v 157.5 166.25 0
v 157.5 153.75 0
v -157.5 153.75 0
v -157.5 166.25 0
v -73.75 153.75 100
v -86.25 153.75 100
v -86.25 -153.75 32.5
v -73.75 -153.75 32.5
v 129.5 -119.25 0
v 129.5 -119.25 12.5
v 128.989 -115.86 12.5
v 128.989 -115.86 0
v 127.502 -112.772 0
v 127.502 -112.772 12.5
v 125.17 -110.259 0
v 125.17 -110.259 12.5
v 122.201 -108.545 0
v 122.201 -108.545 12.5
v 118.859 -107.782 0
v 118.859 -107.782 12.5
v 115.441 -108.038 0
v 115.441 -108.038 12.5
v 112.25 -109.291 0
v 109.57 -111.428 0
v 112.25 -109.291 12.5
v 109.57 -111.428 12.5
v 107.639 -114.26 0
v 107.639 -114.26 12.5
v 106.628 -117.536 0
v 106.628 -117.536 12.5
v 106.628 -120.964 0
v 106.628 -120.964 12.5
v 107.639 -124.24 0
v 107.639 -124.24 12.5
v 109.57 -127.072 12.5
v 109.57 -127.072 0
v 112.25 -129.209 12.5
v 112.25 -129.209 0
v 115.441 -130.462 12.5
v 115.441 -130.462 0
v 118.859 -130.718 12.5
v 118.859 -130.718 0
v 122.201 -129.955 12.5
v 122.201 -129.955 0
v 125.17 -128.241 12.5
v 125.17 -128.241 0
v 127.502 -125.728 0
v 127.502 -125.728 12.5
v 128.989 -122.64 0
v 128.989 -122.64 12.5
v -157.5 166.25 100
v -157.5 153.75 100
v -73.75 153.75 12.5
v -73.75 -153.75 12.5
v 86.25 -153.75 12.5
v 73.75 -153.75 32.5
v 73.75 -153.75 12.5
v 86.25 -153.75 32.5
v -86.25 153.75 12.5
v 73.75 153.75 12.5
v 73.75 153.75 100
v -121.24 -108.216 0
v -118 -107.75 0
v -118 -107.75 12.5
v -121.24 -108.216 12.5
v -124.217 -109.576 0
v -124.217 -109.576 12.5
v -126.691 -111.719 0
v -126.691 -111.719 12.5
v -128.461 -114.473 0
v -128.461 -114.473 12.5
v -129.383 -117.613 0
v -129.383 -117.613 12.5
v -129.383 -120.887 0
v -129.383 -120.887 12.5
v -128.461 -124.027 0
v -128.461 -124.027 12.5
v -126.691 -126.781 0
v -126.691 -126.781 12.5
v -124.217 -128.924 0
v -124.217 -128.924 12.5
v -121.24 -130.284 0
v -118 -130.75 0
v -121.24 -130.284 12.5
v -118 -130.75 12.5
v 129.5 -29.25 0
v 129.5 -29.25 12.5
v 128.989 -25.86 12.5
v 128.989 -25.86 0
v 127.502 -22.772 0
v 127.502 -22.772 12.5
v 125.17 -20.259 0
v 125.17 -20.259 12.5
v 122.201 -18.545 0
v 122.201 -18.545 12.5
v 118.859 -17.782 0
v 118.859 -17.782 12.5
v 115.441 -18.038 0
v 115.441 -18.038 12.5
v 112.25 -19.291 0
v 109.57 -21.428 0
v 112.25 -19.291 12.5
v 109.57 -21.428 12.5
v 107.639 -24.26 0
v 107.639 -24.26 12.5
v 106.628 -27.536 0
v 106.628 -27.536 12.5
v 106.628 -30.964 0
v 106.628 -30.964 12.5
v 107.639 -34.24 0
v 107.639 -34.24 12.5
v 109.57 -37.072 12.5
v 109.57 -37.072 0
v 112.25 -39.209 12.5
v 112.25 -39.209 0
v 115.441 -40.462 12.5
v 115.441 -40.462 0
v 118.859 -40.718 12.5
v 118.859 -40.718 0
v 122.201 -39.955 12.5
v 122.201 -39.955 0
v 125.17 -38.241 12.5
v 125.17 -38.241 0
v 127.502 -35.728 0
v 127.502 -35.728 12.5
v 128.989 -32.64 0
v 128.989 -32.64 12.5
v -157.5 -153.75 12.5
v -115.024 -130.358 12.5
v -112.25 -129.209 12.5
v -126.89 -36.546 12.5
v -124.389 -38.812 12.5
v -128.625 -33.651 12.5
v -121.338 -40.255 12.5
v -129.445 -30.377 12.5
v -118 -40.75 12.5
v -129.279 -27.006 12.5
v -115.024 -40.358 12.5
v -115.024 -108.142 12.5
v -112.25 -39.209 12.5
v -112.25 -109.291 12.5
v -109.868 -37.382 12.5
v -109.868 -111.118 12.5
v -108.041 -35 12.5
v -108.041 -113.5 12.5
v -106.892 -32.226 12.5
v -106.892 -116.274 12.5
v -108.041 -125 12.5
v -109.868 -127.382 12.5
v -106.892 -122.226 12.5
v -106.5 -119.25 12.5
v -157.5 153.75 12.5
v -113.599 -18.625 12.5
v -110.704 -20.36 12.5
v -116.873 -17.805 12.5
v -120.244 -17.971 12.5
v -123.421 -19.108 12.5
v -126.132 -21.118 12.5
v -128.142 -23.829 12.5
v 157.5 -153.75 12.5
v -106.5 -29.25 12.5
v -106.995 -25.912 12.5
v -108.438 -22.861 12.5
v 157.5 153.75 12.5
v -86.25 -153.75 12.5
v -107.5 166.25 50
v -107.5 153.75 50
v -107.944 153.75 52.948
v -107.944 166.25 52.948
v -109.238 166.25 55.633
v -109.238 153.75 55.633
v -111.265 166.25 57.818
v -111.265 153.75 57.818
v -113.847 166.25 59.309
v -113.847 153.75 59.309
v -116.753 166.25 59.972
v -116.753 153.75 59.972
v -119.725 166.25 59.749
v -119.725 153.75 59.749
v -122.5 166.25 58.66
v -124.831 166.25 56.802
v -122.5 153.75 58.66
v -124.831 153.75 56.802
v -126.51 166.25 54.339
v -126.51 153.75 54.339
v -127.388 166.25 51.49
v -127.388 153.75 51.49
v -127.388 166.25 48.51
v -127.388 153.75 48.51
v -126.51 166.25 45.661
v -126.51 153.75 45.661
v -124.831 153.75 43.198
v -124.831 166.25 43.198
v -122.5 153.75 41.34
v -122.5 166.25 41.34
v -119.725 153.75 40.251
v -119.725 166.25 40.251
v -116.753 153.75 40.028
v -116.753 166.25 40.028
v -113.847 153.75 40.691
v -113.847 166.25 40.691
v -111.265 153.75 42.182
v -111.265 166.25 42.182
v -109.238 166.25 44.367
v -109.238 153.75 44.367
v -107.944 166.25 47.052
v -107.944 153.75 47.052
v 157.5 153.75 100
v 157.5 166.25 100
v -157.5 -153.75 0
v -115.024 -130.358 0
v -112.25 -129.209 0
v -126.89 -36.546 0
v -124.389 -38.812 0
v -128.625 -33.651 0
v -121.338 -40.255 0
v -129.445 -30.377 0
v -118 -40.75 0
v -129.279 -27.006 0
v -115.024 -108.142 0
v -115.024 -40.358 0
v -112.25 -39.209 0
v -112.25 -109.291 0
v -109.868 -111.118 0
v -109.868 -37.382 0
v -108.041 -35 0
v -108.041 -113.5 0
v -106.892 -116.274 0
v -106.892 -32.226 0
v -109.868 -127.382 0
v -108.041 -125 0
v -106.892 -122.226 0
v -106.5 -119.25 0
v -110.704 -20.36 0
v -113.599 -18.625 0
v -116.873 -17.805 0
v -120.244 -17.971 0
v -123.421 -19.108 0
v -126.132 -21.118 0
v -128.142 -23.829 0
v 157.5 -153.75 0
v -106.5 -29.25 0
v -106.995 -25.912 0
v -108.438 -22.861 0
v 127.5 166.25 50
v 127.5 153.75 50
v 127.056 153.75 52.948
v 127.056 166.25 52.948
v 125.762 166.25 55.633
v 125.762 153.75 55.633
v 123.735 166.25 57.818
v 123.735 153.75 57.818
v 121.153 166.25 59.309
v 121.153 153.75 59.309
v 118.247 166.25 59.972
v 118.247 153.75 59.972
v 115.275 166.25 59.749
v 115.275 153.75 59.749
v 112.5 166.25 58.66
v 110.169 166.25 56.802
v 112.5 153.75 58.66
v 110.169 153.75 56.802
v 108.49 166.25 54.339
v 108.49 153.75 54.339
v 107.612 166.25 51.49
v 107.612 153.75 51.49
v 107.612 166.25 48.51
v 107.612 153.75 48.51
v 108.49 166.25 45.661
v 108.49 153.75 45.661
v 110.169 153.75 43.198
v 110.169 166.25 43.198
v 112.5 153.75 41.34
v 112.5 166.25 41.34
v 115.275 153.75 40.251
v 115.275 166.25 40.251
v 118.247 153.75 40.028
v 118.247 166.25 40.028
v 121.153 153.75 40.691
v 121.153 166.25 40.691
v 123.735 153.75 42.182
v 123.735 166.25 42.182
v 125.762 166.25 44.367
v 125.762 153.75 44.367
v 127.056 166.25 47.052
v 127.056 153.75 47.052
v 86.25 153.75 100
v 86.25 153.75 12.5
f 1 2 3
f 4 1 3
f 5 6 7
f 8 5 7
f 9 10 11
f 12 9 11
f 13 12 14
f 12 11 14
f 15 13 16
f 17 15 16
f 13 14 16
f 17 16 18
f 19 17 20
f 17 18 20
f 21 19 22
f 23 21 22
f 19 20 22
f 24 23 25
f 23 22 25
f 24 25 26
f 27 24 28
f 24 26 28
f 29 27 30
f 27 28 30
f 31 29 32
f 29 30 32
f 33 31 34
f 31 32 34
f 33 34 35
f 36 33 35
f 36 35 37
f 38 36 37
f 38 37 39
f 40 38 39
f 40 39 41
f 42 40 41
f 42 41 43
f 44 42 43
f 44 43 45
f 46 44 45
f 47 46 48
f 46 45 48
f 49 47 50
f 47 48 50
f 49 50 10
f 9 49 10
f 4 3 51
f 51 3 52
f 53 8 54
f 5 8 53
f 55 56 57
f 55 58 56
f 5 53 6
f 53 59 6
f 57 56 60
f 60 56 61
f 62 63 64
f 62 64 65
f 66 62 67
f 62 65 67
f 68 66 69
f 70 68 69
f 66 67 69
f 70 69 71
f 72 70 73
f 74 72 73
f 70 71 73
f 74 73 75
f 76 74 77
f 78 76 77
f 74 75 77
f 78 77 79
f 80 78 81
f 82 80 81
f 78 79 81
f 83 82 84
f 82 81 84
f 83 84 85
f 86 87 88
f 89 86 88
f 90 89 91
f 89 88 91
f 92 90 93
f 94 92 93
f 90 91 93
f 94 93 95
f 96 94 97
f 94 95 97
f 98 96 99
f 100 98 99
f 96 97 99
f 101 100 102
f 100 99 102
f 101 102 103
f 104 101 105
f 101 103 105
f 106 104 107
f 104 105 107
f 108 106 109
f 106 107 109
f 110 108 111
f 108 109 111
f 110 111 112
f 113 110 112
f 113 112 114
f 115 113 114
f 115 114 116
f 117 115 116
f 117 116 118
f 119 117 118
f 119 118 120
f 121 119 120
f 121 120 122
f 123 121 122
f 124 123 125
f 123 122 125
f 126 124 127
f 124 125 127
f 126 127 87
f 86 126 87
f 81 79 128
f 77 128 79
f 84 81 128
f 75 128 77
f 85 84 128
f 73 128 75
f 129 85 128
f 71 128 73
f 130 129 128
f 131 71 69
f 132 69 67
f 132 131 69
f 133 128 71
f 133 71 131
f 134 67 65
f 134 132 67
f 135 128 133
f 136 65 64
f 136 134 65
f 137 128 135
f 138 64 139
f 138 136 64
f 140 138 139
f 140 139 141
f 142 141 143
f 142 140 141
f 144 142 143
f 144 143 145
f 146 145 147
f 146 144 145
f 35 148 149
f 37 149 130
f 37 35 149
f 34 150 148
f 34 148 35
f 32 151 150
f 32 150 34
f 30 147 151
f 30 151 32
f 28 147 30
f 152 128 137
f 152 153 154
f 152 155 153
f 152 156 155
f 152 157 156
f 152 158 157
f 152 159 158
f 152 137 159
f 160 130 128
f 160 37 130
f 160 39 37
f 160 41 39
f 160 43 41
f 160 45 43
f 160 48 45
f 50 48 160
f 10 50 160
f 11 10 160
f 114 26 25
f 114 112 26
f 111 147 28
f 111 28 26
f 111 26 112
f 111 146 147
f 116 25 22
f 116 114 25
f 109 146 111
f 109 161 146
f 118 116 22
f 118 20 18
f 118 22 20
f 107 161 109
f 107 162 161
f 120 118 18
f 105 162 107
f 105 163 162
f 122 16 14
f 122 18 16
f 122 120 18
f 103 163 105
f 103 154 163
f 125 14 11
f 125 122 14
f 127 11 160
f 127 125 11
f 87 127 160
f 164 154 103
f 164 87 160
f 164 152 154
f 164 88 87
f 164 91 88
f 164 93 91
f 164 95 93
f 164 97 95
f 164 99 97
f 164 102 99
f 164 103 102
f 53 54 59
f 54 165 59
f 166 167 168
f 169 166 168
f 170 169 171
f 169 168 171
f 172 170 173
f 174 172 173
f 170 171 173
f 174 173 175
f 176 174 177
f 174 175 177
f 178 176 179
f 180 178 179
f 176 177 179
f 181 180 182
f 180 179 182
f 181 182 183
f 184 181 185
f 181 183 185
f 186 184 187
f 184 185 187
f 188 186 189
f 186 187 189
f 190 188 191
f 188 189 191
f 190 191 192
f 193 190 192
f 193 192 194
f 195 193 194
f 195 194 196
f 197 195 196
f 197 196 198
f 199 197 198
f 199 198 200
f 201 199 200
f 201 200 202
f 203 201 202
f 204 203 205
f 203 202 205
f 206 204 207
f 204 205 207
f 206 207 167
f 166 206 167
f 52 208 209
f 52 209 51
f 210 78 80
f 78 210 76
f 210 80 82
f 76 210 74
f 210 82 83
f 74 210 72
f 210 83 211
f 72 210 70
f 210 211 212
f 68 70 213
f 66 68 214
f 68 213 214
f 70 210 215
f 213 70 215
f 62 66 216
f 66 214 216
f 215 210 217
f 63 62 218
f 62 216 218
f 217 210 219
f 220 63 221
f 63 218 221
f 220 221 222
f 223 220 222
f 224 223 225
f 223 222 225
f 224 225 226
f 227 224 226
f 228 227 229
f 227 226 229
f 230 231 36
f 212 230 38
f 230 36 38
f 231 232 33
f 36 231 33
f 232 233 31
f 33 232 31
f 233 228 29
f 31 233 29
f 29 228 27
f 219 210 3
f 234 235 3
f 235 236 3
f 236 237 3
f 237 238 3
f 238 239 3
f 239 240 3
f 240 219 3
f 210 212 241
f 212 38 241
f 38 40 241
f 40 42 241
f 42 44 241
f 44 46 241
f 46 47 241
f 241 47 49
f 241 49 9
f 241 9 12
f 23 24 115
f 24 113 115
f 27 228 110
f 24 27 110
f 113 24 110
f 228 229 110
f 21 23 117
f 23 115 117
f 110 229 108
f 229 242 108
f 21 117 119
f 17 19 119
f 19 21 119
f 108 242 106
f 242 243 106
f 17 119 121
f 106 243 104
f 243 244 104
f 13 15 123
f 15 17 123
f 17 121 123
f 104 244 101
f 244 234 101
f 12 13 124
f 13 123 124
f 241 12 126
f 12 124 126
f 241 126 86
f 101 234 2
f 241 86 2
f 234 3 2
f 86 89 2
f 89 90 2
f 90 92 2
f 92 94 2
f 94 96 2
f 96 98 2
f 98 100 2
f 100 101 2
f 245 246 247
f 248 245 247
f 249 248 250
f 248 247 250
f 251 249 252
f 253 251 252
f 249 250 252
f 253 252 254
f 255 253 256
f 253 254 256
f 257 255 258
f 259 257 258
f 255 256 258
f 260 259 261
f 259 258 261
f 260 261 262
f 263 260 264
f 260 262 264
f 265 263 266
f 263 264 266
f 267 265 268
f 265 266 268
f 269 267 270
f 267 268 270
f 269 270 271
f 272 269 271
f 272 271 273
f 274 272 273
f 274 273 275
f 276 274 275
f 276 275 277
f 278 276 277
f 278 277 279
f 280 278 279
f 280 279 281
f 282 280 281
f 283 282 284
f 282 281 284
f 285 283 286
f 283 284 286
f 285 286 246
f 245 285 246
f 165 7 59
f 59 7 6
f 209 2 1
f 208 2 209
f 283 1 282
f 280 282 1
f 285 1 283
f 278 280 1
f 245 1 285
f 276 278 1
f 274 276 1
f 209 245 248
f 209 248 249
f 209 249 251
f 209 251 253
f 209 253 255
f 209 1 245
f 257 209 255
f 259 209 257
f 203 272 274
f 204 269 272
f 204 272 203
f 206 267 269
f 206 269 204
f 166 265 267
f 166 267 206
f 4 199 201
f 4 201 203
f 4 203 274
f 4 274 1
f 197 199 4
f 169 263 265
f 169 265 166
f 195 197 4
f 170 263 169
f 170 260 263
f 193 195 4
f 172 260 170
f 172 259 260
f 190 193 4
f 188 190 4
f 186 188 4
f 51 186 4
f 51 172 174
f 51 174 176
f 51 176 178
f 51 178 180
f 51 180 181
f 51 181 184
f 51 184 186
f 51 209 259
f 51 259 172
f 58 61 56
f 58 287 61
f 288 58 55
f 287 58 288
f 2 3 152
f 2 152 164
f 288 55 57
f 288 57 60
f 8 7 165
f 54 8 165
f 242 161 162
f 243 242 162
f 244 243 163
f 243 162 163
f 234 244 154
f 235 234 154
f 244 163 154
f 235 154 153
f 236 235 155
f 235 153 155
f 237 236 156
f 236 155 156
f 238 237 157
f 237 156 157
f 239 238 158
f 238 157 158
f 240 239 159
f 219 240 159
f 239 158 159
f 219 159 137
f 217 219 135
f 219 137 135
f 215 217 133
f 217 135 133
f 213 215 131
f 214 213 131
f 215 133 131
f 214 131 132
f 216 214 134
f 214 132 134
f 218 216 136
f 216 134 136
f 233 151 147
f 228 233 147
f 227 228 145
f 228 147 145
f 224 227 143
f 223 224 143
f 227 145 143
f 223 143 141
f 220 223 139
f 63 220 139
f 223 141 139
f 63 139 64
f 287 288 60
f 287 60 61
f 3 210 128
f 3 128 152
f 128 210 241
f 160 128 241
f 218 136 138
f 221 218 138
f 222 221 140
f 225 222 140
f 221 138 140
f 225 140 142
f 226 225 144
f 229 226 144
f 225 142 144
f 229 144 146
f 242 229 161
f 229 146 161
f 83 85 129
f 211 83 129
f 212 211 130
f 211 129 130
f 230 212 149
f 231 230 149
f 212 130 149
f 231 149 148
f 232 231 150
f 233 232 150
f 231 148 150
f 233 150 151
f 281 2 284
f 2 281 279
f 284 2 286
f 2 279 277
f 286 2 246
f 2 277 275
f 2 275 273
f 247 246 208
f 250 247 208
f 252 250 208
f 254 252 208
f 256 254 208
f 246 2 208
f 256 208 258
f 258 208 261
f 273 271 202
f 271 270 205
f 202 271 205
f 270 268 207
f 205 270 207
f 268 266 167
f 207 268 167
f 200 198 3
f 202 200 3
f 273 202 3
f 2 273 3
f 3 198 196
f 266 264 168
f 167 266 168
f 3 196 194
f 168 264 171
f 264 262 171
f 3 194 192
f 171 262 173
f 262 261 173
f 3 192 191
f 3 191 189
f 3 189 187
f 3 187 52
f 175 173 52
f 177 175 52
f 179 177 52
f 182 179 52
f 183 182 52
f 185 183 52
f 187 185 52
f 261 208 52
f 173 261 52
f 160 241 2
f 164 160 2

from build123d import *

# Parameters (mm, degrees)
F0_W      = 315
F0_H      = 307.5
F1_DEPTH  = 12.5
F2_W      = 315
F2_H      = 100
F3_DEPTH  = 12.5
F9_DEPTH  = 6.25
F10_R     = 10
F11_DEPTH = 12.5
F12_R     = 11.5
F13_DEPTH = 12.5


with BuildPart() as f1:
    # F0 (on Top) → F1 (new body)
    with BuildSketch(Plane.XY):
        Rectangle(F0_W, F0_H)
    extrude(amount=F1_DEPTH)

    # F12 (on face) → F13 (cut, through all)
    with BuildSketch(Plane.XY.offset(12.5)):
        with BuildLine():
            ThreePointArc((-118, -130.75), (-109.868272, -127.381728), (-106.5, -119.25))
            ThreePointArc((-106.5, -119.25), (-109.868272, -111.118272), (-118, -107.75))
            Line((-118, -107.75), (-118, -130.75))
        make_face()
        with BuildLine():
            ThreePointArc((-106.5, -29.25), (-126.131728, -21.118272), (-118, -40.75))
            ThreePointArc((-118, -40.75), (-109.868272, -37.381728), (-106.5, -29.25))
        make_face()
        with BuildLine():
            Line((-118, -130.75), (-118, -107.75))
            ThreePointArc((-118, -107.75), (-129.5, -119.25), (-118, -130.75))
        make_face()
        with Locations((118, -29.25)):
            Circle(F12_R)
        with Locations((118, -119.25)):
            Circle(F12_R)
    extrude(amount=-F13_DEPTH, mode=Mode.SUBTRACT)


with BuildPart() as f3:
    # F2 (on face) → F3 (new body)
    with BuildSketch(Plane(origin=(0, 153.75, 0), x_dir=(-1, 0, 0), z_dir=(0, 1, 0))):
        with Locations((0, 50)):
            Rectangle(F2_W, F2_H)
    extrude(amount=F3_DEPTH)

    # F10 (on face) → F11 (cut, through all)
    with BuildSketch(Plane.XZ.offset(-153.75)):
        with Locations((117.5, 50)):
            Circle(F10_R)
        with Locations((-117.5, 50)):
            Circle(F10_R)
    extrude(amount=-F11_DEPTH, mode=Mode.SUBTRACT)


with BuildPart() as f9:
    # F7 (on offset) + F8 (on offset) → F9 (new body, symmetric)
    with BuildSketch(Plane.YZ.offset(-80)):
        Polygon((-153.75, 32.5), (-153.75, 12.5), (153.75, 12.5), (153.75, 100), align=None)
    with BuildSketch(Plane.YZ.offset(80)):
        Polygon((-153.75, 32.5), (-153.75, 12.5), (153.75, 12.5), (153.75, 100), align=None)
    extrude(amount=F9_DEPTH, both=True)


solid = Compound([f1.part, f3.part, f9.part])
